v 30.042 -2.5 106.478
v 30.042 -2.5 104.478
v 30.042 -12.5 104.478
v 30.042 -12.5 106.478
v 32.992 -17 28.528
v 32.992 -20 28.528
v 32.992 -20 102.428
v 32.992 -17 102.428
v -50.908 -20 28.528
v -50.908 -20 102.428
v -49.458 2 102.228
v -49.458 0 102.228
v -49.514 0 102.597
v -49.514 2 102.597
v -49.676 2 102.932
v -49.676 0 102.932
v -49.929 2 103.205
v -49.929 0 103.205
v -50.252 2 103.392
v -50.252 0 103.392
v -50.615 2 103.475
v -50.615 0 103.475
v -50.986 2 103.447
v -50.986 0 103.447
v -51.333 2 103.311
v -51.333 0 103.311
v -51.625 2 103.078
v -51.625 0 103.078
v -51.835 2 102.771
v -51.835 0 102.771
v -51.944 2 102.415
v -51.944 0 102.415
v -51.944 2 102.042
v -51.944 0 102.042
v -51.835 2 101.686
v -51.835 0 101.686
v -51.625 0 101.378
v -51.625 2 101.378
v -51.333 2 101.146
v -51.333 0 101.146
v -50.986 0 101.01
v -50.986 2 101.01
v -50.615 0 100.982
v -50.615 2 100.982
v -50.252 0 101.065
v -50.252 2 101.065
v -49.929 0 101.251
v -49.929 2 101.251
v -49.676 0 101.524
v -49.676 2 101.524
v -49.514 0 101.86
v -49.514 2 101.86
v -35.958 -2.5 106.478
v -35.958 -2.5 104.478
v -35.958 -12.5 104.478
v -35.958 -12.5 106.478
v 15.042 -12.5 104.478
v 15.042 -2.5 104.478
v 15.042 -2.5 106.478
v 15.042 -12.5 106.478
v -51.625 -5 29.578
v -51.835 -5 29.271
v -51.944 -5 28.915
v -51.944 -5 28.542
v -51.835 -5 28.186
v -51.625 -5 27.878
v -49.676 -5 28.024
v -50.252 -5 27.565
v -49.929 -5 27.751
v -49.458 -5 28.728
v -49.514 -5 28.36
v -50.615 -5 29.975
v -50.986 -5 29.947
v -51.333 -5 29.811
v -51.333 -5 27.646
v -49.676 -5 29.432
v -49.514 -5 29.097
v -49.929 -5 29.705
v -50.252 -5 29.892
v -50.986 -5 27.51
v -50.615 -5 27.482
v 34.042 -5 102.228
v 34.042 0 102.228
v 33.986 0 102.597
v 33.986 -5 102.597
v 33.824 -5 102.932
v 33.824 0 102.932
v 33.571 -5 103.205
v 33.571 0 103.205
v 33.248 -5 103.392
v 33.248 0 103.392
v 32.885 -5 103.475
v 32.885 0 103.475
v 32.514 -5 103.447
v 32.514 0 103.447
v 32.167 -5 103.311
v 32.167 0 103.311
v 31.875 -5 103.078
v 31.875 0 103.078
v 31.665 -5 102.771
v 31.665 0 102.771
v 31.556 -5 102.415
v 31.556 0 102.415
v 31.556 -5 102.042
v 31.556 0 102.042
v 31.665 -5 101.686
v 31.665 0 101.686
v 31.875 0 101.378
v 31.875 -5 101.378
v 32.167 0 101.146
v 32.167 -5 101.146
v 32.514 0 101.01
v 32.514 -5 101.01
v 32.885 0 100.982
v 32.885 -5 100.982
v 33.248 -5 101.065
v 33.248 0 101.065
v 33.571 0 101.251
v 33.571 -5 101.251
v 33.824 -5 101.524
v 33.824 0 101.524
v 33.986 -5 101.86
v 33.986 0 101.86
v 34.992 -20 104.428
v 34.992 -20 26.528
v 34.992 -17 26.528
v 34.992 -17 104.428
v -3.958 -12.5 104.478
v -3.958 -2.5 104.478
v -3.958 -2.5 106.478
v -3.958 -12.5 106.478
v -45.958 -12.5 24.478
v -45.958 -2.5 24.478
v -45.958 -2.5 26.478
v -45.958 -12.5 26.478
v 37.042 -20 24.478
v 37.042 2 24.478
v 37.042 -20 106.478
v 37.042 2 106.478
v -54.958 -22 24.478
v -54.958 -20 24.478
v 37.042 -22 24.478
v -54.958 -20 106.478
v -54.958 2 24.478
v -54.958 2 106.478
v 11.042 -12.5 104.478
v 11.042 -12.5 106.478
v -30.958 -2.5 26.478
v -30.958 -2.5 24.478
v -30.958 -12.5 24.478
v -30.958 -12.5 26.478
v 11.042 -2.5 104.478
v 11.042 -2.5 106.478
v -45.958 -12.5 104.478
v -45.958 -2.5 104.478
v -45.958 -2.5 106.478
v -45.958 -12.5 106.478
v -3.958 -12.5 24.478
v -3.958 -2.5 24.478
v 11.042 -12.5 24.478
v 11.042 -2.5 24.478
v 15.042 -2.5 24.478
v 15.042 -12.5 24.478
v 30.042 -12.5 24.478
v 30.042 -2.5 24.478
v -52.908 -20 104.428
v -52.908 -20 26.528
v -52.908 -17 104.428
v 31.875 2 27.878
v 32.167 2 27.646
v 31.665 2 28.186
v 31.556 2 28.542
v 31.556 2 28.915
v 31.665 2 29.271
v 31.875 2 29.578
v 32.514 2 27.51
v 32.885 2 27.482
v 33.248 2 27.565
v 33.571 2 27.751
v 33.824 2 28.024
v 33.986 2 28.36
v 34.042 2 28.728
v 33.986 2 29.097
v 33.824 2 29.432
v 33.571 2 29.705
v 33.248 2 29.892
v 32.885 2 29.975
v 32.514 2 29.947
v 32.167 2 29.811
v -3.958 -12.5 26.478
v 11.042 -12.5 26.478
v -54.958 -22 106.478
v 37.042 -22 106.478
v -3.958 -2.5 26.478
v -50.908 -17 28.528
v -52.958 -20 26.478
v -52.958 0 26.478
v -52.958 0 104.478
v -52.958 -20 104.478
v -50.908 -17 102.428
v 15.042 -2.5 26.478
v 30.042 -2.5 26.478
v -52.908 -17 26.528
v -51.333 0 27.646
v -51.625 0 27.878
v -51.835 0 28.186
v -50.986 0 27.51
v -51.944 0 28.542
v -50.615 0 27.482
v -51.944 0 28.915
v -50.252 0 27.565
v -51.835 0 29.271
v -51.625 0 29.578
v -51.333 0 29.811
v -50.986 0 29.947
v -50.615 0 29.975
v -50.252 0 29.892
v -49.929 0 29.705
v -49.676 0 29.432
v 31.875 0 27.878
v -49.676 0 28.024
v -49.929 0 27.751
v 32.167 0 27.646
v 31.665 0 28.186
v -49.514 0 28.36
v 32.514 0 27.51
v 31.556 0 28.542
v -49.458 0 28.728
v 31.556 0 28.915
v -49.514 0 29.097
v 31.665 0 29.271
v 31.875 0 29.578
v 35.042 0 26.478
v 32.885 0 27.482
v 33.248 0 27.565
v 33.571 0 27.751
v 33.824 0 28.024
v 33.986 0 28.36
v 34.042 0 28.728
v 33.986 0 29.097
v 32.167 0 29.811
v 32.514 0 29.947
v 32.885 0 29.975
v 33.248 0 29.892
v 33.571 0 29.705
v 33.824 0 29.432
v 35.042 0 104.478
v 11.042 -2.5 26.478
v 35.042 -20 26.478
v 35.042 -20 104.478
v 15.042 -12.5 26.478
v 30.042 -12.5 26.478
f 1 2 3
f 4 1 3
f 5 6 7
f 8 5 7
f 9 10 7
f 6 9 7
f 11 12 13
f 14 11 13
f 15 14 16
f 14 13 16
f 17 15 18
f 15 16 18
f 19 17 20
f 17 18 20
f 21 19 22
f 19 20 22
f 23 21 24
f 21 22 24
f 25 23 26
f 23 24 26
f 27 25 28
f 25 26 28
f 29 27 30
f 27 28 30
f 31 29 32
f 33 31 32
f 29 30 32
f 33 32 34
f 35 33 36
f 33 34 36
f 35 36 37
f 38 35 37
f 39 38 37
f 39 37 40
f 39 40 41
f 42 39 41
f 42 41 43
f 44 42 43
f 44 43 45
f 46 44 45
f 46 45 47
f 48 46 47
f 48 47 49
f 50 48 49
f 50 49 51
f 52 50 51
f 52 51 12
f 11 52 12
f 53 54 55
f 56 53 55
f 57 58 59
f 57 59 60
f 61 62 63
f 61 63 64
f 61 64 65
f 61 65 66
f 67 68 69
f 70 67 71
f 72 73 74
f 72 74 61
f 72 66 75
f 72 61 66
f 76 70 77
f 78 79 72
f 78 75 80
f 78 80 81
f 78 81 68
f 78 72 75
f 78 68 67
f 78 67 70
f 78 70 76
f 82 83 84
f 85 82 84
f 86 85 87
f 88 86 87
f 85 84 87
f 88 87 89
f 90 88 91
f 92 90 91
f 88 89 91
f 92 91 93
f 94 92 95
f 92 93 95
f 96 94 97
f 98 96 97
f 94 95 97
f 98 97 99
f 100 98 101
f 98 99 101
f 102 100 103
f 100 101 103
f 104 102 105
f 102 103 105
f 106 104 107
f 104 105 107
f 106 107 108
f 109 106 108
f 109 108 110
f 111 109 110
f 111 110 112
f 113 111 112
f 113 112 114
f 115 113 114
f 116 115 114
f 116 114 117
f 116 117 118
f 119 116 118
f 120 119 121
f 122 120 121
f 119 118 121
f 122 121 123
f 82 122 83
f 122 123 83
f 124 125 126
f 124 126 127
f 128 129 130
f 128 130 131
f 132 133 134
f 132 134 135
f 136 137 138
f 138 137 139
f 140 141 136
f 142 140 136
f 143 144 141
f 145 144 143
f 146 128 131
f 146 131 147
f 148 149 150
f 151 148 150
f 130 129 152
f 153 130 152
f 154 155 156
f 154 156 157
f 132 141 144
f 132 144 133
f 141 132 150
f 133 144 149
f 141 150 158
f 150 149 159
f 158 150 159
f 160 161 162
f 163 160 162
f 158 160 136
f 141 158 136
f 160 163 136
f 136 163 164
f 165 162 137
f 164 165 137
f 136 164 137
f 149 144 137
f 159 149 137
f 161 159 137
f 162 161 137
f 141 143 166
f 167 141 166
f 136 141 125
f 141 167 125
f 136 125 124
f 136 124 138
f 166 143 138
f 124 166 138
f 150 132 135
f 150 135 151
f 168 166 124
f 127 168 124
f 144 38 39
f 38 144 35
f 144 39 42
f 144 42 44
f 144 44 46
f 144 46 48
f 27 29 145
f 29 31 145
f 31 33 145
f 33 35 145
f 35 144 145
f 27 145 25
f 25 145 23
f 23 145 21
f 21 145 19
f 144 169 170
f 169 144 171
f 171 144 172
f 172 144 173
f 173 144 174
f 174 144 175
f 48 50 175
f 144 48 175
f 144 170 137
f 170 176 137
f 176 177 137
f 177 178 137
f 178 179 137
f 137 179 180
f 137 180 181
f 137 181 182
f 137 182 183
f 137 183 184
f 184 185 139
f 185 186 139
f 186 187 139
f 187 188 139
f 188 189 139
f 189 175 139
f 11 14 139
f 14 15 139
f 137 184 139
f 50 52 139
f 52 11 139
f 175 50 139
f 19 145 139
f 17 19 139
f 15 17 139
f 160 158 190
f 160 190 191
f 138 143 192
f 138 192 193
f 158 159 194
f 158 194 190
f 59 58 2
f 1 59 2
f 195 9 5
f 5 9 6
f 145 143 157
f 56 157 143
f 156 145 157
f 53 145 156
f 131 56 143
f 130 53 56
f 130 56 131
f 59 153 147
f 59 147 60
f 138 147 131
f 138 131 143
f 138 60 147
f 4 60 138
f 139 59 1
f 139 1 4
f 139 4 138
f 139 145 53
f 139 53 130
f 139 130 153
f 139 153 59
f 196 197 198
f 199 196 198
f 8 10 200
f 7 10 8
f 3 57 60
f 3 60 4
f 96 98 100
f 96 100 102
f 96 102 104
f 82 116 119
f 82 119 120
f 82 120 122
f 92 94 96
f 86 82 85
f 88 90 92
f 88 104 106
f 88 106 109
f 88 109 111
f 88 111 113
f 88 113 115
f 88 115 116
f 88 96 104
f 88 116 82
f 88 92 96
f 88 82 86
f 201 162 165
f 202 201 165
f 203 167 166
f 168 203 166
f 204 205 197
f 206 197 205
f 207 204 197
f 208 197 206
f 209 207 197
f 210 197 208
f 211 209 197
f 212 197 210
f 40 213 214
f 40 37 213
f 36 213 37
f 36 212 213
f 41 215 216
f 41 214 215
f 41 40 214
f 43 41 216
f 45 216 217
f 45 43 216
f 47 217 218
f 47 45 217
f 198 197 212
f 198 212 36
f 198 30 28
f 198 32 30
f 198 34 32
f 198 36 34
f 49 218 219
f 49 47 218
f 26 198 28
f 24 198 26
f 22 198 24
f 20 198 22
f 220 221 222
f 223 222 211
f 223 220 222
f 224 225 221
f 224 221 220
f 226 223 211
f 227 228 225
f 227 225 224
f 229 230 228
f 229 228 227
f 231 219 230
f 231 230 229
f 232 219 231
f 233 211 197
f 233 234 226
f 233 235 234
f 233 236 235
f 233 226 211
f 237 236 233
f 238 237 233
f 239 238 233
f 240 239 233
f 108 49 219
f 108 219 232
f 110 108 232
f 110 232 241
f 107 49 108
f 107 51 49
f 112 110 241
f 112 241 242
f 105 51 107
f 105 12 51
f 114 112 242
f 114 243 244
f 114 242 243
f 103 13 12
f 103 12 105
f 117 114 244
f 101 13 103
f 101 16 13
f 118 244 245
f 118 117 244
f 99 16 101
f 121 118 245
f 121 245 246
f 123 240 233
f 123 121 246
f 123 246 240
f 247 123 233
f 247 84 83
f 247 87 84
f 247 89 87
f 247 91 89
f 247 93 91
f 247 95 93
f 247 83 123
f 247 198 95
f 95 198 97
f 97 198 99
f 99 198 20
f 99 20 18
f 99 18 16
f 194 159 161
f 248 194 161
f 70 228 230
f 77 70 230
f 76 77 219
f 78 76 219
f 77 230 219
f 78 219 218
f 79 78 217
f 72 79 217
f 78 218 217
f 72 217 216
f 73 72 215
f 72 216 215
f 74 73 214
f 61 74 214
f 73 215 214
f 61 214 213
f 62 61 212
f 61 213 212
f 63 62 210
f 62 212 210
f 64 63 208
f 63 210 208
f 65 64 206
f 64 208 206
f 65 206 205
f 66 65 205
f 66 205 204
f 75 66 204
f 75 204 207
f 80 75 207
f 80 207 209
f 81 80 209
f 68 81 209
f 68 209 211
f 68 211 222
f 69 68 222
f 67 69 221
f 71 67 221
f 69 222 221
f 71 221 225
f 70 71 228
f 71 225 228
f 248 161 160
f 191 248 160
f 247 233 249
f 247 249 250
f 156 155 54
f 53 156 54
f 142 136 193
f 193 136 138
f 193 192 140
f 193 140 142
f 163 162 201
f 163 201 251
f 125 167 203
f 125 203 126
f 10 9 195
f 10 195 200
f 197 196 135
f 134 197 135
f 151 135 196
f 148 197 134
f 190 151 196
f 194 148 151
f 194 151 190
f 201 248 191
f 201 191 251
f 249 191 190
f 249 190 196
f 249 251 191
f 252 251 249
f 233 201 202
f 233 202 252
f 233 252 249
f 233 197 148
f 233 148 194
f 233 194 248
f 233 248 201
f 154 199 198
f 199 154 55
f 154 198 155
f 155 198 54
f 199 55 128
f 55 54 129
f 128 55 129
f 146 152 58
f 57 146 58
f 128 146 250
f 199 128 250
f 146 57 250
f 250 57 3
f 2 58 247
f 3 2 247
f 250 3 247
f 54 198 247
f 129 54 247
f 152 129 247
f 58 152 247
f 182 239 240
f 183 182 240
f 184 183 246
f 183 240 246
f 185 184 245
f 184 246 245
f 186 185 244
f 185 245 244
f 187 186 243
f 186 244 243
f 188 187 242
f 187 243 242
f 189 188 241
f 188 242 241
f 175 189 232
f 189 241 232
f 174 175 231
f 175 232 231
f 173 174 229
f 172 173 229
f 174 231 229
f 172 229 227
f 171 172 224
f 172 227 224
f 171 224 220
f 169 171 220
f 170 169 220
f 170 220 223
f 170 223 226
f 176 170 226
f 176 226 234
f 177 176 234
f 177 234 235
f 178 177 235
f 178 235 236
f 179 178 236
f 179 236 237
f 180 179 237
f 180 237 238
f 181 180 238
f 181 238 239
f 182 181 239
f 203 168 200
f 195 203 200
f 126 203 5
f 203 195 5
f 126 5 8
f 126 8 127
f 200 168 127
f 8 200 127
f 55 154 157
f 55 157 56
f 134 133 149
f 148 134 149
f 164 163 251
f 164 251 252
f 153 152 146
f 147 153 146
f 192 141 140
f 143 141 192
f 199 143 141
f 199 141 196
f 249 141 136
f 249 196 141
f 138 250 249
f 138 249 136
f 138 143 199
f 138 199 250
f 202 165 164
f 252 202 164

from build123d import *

# Parameters (mm, degrees)
F0_W      = 92
F0_H      = 82
F1_DEPTH  = 2
F2_W      = 92
F2_H      = 82
F2_W_2    = 88
F2_H_2    = 78
F3_DEPTH  = 20
F4_W      = 15
F4_H      = 10
F4_W_2    = 10
F5_DEPTH  = 95
F4_W_3    = 5
F6_DEPTH  = 25
F7_R      = 1.25
F8_DEPTH  = 5
F9_DEPTH  = 25
F10_W     = 92
F10_H     = 82
F11_DEPTH = 2
F12_W     = 87.9
F12_H     = 77.9
F12_W_2   = 83.9
F12_H_2   = 73.9
F13_DEPTH = 5


with BuildPart() as f1:
    # F0 (on Front) → F1 (new body)
    with BuildSketch(Plane.XZ):
        with Locations((-8.958335, 65.478207)):
            Rectangle(F0_W, F0_H)
    extrude(amount=-F1_DEPTH)

    # F2 (on face) → F3 (join)
    with BuildSketch(Plane.XZ):
        with Locations((-8.958335, 65.478207)):
            Rectangle(F2_W, F2_H)
        with Locations((-8.958335, 65.478207)):
            Rectangle(F2_W_2, F2_H_2, mode=Mode.SUBTRACT)
    extrude(amount=F3_DEPTH)

    # F4 (on face) → F5 (cut)
    with BuildSketch(Plane(origin=(0, 0, 24.478207), x_dir=(1, 0, 0), z_dir=(0, 0, -1))):
        with Locations((22.541665, 7.5)):
            Rectangle(F4_W, F4_H)
        with Locations((3.541665, 7.5)):
            Rectangle(F4_W, F4_H)
        with Locations((-40.958335, 7.5)):
            Rectangle(F4_W_2, F4_H)
    extrude(amount=-F5_DEPTH, mode=Mode.SUBTRACT)

    # F4 (on face) → F6 (cut)
    with BuildSketch(Plane(origin=(0, 0, 24.478207), x_dir=(1, 0, 0), z_dir=(0, 0, -1))):
        with Locations((22.541665, 7.5)):
            Rectangle(F4_W, F4_H)
        with Locations((3.541665, 7.5)):
            Rectangle(F4_W, F4_H)
        with Locations((-40.958335, 7.5)):
            Rectangle(F4_W_2, F4_H)
        with Locations((-33.458335, 7.5)):
            Rectangle(F4_W_3, F4_H)
    extrude(amount=-F6_DEPTH, mode=Mode.SUBTRACT)

    # F7 (on face) → F8 (join)
    with BuildSketch(Plane.XZ):
        with Locations((-50.708335, 28.728207)):
            Circle(F7_R)
        with Locations((32.791665, 102.228207)):
            Circle(F7_R)
    extrude(amount=F8_DEPTH)

    # F7 (on face) → F9 (cut)
    with BuildSketch(Plane.XZ):
        with Locations((32.791665, 28.728207)):
            Circle(F7_R)
        with Locations((-50.708335, 102.228207)):
            Circle(F7_R)
    extrude(amount=-F9_DEPTH, mode=Mode.SUBTRACT)


with BuildPart() as f11:
    # F10 (on face) → F11 (new body)
    with BuildSketch(Plane.XZ.offset(20)):
        with Locations((-8.958335, 65.478207)):
            Rectangle(F10_W, F10_H)
    extrude(amount=F11_DEPTH)

    # F12 (on face) → F13 (join)
    with BuildSketch(Plane.XZ.offset(22)):
        with Locations((-8.958335, 65.478207)):
            Rectangle(F12_W, F12_H)
        with Locations((-8.958335, 65.478207)):
            Rectangle(F12_W_2, F12_H_2, mode=Mode.SUBTRACT)
    extrude(amount=-F13_DEPTH)


solid = Compound([f1.part, f11.part])
